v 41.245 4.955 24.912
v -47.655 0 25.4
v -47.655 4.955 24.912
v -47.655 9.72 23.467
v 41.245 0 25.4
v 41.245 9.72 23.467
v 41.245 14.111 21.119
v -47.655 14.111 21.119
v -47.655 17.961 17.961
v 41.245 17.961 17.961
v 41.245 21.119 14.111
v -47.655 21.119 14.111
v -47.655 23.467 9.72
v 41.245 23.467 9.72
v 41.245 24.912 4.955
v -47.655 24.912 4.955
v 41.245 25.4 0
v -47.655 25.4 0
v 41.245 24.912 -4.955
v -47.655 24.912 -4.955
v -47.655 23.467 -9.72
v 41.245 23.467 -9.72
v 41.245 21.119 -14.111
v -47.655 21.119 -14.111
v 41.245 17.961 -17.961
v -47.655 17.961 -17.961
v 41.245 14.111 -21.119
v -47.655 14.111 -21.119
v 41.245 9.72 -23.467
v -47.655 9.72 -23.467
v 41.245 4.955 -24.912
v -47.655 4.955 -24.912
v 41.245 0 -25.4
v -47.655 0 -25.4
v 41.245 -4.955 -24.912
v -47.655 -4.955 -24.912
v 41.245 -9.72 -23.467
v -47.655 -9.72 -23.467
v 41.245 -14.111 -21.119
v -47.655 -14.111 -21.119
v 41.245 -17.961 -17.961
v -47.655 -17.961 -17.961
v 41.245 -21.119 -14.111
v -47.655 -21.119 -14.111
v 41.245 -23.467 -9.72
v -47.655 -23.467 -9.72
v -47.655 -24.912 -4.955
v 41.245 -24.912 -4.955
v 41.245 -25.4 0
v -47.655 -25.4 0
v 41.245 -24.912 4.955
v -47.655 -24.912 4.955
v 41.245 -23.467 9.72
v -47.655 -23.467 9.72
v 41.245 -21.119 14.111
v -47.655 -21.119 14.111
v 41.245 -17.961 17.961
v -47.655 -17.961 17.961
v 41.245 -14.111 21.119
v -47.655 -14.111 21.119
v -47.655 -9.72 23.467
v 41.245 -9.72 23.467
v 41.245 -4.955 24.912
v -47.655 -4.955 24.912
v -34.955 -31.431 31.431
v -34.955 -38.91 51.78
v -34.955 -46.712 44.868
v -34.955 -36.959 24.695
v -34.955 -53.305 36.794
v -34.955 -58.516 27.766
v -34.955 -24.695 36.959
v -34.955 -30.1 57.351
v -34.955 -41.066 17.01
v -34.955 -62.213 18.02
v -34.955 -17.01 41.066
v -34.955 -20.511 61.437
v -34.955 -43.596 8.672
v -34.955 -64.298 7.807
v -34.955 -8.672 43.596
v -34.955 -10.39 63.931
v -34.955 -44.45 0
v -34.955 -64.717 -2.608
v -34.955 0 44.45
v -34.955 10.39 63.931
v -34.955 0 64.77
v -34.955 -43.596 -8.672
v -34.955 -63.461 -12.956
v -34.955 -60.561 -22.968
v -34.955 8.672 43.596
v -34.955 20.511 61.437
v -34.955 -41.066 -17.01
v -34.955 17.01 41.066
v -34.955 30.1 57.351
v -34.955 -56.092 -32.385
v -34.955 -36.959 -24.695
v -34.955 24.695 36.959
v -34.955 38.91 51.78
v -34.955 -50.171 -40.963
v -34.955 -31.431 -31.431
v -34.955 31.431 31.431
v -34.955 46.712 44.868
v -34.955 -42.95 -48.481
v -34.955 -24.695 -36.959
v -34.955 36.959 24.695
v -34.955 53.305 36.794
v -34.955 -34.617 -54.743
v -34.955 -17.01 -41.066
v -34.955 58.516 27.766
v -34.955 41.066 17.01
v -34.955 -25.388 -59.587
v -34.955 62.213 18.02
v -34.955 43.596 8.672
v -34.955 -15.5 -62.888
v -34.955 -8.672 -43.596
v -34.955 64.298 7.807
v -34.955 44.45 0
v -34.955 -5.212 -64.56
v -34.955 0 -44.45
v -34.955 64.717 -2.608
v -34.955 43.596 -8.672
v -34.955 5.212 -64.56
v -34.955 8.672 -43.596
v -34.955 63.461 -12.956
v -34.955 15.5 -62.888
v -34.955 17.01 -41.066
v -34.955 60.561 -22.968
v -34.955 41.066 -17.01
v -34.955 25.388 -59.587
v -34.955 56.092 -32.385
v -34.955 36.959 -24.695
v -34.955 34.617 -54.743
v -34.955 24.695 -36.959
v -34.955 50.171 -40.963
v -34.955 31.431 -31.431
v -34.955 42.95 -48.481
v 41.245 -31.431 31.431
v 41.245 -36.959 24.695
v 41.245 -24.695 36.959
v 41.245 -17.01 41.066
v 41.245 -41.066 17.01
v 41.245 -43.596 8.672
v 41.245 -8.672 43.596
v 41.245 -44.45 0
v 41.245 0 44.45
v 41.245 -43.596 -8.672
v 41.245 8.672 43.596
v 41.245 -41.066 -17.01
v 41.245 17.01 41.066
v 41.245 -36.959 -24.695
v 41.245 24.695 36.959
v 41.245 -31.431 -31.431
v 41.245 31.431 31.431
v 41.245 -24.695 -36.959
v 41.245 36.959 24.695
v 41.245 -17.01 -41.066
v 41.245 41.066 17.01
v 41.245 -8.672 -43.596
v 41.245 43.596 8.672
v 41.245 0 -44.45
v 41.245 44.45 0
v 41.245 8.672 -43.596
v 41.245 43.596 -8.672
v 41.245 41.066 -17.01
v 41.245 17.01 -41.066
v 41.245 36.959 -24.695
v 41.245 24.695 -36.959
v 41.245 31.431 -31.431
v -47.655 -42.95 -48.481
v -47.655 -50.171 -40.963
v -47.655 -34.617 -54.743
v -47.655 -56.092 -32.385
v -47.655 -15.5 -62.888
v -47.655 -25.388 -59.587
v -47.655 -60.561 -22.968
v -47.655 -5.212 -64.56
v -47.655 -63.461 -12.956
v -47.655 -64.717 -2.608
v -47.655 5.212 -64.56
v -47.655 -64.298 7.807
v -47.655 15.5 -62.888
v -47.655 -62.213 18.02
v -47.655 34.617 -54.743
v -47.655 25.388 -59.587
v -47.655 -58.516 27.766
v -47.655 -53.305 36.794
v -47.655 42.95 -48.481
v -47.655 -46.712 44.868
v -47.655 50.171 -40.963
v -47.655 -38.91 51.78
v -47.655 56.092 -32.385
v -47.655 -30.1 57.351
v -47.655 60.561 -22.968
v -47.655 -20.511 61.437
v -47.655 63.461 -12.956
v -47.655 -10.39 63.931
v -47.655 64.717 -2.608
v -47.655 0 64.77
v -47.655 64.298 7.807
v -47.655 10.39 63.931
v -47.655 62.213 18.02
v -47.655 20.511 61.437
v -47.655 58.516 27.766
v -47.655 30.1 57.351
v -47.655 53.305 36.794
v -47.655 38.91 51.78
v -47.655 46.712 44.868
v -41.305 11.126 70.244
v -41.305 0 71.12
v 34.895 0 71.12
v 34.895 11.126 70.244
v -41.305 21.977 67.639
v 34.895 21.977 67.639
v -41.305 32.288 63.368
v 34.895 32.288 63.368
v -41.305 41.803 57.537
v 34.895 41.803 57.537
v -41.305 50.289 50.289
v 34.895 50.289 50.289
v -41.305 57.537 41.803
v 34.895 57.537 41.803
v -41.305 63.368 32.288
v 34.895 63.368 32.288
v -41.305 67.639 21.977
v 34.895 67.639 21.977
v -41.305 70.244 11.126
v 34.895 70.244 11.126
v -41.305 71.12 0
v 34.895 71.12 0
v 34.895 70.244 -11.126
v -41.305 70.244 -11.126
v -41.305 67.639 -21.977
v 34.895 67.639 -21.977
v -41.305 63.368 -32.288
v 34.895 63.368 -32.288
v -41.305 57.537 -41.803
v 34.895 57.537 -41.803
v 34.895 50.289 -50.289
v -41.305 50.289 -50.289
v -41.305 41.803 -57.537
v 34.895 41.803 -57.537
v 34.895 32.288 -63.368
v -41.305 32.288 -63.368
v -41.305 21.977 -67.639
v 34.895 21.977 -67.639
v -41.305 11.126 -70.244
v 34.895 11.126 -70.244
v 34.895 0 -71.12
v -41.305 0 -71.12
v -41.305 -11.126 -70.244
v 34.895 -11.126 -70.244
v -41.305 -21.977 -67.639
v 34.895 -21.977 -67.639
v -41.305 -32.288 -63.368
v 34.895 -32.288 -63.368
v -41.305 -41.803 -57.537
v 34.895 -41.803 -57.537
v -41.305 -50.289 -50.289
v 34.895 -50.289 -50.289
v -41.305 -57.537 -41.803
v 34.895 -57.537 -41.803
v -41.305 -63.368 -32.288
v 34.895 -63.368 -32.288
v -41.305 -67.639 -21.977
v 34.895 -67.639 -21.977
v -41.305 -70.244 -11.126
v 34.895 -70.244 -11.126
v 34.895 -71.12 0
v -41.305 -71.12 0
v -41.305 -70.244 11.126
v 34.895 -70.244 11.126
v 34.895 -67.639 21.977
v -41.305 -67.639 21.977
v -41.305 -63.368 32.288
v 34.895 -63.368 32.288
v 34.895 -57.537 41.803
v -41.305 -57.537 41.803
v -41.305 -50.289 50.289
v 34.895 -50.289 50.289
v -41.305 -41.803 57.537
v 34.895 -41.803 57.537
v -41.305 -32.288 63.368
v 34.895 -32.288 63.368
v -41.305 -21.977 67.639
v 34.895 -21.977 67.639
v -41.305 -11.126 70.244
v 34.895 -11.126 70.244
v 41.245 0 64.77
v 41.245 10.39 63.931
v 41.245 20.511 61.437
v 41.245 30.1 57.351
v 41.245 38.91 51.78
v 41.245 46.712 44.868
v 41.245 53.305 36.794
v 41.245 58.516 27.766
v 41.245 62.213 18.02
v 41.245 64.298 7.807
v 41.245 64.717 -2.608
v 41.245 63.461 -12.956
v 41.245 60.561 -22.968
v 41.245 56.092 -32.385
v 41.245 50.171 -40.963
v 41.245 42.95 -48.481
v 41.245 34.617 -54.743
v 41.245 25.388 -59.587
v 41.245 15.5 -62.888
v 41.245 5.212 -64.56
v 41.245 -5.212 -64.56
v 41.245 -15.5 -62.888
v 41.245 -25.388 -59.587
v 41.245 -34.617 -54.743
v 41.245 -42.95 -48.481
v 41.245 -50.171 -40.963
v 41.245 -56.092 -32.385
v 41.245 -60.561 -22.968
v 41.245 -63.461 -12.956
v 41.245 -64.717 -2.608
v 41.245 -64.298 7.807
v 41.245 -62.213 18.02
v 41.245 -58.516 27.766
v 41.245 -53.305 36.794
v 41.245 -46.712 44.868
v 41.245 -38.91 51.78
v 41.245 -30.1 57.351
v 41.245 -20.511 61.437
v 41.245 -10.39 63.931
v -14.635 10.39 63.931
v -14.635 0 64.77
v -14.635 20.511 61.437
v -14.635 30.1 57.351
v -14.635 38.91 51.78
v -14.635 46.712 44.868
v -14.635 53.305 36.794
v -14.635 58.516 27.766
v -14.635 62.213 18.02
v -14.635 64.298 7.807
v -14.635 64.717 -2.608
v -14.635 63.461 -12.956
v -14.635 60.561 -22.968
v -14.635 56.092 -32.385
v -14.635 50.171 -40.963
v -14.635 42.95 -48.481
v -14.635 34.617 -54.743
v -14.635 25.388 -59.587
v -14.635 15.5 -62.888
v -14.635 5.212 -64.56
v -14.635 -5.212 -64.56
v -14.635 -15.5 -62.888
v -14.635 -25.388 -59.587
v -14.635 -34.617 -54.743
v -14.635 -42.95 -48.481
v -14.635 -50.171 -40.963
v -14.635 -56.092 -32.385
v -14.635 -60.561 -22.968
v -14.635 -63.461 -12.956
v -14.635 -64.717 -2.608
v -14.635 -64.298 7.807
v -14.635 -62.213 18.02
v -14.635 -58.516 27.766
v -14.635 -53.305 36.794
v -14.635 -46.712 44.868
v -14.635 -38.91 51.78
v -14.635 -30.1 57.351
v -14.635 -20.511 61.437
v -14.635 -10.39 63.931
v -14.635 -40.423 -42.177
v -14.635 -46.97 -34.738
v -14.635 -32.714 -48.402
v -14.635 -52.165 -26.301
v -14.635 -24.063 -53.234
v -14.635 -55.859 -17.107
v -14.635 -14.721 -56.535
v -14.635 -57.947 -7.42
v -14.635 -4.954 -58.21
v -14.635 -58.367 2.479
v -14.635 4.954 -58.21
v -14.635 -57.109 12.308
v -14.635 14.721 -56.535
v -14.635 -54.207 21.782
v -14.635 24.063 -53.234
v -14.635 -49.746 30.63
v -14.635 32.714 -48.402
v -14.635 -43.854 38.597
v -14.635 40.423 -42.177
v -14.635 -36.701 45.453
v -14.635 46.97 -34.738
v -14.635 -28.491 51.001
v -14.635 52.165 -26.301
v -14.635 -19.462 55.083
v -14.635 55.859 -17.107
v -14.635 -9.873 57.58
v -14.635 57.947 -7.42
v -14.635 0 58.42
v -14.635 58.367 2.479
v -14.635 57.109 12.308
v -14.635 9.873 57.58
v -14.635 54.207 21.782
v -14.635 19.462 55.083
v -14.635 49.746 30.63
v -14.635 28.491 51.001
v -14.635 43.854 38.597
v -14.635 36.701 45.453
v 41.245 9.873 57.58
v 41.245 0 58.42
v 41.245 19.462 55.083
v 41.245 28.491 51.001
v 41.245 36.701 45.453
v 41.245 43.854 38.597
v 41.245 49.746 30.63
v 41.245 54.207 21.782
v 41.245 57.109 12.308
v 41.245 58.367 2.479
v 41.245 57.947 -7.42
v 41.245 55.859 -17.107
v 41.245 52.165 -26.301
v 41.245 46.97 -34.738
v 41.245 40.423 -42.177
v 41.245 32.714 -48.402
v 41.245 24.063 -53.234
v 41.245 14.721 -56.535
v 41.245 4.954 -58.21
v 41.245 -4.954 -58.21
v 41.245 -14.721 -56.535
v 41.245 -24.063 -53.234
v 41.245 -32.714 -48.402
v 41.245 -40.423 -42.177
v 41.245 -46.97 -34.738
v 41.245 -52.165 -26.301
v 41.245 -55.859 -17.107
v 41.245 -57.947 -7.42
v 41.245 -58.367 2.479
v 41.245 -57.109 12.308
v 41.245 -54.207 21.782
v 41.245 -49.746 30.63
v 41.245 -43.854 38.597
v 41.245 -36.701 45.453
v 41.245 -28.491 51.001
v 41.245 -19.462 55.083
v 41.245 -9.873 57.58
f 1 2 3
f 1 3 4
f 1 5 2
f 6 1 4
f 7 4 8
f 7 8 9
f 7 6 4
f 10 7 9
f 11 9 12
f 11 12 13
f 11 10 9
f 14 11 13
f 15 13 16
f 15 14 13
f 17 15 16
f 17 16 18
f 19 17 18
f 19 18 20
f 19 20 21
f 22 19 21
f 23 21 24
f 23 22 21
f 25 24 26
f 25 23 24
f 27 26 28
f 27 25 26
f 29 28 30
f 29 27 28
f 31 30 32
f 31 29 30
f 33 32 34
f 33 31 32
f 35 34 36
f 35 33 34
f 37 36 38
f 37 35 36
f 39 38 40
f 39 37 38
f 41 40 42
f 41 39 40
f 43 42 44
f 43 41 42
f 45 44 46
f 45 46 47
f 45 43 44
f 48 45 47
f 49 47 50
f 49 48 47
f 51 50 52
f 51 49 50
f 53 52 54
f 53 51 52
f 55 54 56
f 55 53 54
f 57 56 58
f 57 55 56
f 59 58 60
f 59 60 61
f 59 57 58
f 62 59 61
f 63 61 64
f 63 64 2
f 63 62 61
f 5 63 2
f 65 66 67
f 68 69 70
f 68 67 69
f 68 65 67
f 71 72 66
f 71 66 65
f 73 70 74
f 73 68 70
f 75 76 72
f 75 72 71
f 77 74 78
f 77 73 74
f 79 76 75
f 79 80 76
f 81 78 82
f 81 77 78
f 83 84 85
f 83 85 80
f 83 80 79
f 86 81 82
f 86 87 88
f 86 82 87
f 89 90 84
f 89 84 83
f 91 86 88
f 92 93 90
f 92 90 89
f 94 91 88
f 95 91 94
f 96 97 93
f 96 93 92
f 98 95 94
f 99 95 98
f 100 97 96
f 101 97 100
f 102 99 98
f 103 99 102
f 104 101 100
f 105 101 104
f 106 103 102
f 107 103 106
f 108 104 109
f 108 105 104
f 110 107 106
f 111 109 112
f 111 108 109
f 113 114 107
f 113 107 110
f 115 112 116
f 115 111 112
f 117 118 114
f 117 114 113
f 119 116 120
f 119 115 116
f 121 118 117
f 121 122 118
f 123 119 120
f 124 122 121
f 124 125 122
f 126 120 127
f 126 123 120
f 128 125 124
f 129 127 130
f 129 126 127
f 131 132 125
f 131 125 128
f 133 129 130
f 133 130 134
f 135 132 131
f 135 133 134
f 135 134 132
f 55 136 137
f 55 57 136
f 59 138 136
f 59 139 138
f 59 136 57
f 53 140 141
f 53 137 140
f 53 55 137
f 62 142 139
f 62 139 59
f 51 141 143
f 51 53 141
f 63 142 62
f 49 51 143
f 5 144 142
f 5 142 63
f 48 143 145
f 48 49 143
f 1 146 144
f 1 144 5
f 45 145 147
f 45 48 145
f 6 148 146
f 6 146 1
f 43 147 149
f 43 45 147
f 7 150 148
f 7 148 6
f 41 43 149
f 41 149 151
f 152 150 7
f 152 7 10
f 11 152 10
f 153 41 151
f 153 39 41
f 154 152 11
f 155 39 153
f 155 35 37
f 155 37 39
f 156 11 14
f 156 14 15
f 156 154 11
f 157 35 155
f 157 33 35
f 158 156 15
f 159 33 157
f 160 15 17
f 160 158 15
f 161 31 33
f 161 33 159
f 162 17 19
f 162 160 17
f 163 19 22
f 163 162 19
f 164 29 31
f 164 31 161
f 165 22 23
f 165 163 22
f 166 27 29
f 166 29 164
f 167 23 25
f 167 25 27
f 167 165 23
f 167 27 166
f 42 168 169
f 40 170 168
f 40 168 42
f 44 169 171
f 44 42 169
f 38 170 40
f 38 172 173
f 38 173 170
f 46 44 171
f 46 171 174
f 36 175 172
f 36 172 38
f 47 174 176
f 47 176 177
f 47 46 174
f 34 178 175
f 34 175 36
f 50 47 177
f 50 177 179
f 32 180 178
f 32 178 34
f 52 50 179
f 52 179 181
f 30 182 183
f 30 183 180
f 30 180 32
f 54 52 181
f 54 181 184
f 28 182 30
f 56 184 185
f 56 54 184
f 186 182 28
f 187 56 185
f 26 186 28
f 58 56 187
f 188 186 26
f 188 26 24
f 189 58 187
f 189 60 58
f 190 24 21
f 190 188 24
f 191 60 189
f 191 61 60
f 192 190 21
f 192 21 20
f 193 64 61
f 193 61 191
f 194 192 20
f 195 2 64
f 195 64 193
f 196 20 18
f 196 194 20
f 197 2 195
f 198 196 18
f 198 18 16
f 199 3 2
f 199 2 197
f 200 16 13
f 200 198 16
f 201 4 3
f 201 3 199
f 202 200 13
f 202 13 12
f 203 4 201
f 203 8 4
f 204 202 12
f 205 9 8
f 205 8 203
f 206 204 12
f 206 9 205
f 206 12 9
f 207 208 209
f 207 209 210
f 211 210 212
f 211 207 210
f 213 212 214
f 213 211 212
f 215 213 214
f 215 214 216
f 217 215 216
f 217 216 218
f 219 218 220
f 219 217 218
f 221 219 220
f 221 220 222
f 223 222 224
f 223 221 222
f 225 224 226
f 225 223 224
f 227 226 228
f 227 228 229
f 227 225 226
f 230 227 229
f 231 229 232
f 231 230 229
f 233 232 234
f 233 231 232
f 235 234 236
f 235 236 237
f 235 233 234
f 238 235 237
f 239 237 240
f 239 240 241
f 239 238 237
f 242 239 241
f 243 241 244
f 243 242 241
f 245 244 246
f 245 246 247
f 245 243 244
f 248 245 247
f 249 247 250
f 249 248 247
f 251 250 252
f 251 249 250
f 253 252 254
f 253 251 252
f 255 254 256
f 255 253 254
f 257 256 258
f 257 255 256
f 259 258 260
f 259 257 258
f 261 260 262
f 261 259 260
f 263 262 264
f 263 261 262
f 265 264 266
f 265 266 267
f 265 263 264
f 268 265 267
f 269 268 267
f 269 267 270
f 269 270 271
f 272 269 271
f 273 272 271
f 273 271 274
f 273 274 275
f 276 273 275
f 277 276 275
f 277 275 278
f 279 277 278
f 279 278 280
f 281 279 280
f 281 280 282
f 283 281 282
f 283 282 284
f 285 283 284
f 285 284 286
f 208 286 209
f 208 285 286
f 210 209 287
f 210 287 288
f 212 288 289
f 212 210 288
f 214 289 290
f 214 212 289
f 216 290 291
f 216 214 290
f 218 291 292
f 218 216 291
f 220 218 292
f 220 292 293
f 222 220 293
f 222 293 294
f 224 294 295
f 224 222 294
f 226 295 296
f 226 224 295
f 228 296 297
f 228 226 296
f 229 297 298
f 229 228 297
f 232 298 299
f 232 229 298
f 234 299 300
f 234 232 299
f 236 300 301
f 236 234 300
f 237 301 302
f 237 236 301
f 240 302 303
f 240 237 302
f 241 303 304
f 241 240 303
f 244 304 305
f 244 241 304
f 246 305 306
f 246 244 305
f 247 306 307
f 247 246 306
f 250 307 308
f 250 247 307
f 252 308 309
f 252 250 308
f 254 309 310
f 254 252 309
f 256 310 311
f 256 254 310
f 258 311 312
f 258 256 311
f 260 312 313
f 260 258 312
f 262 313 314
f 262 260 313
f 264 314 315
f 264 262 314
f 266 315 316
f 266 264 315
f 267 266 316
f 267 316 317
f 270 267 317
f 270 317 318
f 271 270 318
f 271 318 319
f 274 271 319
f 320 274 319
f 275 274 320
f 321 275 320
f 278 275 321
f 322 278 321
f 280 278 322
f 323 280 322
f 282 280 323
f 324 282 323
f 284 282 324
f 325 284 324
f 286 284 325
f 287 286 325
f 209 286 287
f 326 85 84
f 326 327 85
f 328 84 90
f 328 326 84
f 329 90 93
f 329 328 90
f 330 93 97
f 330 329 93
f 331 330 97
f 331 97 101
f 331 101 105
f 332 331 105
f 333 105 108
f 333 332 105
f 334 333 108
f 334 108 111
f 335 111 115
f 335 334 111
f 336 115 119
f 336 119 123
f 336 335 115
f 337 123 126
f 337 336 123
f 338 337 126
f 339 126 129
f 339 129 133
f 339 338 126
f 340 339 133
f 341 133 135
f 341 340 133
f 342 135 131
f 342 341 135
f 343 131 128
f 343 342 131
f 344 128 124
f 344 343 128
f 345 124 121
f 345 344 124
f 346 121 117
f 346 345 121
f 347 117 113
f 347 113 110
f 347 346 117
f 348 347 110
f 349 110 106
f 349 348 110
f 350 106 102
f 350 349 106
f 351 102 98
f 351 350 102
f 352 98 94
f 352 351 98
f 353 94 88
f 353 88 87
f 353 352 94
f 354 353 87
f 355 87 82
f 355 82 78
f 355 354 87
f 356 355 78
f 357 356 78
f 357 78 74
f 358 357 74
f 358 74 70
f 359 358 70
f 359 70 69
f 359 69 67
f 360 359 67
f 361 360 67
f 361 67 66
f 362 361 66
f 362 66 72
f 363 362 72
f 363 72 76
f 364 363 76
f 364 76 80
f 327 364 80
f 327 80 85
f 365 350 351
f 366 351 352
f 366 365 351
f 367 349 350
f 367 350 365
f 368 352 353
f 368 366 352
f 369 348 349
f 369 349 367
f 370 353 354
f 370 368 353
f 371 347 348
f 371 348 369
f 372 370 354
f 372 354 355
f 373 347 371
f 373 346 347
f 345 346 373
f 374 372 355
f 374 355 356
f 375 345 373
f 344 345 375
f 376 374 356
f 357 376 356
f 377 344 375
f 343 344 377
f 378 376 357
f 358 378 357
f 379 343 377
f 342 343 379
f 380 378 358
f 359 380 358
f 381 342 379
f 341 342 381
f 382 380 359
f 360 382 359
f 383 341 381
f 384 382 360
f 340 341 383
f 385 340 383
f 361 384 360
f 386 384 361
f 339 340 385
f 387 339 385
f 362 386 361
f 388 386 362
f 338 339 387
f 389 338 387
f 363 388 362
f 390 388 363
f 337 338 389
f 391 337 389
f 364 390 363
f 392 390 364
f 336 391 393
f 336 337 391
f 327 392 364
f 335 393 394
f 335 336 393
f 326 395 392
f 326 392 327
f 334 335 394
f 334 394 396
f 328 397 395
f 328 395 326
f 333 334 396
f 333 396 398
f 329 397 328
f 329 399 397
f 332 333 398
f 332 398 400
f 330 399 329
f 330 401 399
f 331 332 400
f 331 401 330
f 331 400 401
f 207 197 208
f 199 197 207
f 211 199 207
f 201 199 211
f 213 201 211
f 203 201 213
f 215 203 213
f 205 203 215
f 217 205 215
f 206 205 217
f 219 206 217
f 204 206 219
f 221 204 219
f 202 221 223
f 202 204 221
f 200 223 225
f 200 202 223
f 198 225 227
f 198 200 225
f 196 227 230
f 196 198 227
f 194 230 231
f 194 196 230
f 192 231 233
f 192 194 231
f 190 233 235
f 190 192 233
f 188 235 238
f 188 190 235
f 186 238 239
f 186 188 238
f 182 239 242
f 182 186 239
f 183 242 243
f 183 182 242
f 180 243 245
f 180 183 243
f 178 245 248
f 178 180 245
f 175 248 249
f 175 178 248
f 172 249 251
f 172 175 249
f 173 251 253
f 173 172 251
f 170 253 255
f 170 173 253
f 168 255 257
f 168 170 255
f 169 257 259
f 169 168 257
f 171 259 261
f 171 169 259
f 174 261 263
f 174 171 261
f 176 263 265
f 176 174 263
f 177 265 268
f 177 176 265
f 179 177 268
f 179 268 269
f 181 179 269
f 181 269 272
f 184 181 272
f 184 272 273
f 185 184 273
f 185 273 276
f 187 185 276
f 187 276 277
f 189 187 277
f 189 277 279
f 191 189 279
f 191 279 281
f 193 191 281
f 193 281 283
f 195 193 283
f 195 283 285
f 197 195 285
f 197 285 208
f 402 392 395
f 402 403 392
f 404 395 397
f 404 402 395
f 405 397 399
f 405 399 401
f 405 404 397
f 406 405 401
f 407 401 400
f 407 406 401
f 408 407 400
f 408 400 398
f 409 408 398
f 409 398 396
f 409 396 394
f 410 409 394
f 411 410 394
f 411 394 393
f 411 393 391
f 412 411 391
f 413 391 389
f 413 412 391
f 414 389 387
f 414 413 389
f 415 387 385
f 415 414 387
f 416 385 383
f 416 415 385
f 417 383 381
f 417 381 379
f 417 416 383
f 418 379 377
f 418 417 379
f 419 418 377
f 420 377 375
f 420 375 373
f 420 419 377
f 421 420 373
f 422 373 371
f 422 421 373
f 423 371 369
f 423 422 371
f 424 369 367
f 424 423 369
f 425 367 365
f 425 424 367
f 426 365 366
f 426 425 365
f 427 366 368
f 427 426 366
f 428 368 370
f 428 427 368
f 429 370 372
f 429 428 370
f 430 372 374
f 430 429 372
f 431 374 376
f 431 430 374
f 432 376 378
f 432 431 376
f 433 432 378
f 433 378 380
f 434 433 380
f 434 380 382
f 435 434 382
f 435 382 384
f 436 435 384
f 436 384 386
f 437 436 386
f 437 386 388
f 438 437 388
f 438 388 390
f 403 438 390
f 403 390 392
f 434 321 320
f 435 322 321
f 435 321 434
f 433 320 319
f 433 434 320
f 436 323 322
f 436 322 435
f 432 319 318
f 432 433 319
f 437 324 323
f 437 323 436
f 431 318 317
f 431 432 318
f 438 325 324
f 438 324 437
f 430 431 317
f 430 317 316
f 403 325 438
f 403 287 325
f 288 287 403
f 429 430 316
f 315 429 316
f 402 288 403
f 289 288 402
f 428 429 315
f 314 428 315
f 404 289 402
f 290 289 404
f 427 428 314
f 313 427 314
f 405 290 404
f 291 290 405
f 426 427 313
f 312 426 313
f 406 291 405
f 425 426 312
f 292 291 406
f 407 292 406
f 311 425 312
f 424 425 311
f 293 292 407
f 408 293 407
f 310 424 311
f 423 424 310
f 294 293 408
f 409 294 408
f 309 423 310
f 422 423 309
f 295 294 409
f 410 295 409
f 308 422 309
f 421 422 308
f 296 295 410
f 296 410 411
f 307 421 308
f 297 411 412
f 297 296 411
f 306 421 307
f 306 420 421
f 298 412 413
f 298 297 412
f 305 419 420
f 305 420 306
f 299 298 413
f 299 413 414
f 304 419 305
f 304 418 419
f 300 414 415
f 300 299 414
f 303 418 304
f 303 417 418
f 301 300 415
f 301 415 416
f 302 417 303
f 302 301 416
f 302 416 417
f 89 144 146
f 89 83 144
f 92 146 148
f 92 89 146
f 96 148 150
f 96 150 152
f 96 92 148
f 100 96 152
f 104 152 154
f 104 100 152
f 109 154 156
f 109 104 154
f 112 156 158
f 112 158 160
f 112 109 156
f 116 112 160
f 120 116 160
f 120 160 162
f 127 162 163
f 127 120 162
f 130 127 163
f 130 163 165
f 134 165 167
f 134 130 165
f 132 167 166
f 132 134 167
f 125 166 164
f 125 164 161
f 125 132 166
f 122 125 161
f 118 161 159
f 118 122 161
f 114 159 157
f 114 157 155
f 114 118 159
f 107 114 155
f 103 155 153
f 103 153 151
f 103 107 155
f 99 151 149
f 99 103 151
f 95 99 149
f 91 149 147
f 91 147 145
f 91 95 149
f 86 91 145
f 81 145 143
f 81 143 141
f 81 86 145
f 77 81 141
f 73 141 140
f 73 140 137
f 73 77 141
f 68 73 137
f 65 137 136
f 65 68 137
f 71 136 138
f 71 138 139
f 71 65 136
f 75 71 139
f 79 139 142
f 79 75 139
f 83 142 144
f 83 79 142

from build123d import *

# Parameters (mm, degrees)
F2_SIZE = 6.35


with BuildPart() as f1:
    # F0 (on Front) → F1 (revolve)
    with BuildSketch(Plane.XZ):
        Polygon((-47.655353, 25.4), (41.244647, 25.4), (41.244647, 44.45), (-34.955353, 44.45), (-34.955353, 64.77), (-14.635353, 64.77), (-14.635353, 58.42), (41.244647, 58.42), (41.244647, 71.12), (-47.655353, 71.12), align=None)
    revolve(axis=Axis((-3.749629, 0, 0), (-1, 0, 0)))

    # F2
    f2_edges = [f1.edges().sort_by_distance(p)[0] for p in [
        (41.244647, 0, -71.12),
        (-47.655353, 0, -71.12),
    ]]
    chamfer(f2_edges, length=F2_SIZE)


solid = f1.part
